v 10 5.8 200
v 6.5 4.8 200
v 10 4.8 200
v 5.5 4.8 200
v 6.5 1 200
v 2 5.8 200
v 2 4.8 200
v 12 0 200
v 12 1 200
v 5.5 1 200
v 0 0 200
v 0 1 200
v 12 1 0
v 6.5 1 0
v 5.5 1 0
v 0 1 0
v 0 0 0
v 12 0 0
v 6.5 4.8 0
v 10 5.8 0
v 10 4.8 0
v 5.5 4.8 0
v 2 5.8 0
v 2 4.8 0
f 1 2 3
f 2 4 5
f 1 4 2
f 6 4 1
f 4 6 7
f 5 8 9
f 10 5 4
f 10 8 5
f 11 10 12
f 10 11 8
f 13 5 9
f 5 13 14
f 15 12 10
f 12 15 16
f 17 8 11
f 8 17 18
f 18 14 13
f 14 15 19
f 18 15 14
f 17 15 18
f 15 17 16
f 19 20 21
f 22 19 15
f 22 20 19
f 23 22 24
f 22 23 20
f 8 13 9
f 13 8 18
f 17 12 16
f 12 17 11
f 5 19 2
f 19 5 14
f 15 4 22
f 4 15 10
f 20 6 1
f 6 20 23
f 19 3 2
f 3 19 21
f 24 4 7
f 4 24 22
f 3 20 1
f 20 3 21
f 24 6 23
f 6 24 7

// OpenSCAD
// file: rail.scad
include <parameters.scad>

// Fixed H rail. Overlap is confined to the web ends; the two flange inner
// faces stay exactly at Z=wall and Z=depth-wall (4 mm apart for the new rail).
module rail_geometry(length=rail_length, height=rail_height,
                     depth=rail_depth_target, front_height=rail_front_height,
                     wall=wall_thickness, web=wall_thickness) {
    front_y0 = (height-front_height)/2;
    web_y0 = (height-web)/2;
    assert(length>0 && height>=front_height && front_height>web);
    assert(depth>2*wall && wall>join_overlap && web>0);
    union() {
        // Cabinet mounting base; its rear face is exactly Z=0.
        cube([length, height, wall]);

        // Central web. It overlaps the base and flange by join_overlap.
        translate([0, web_y0, wall-join_overlap])
            cube([length, web, depth-2*wall+2*join_overlap]);

        // Person-facing load flange.
        translate([0, front_y0, depth-wall])
            cube([length, front_height, wall]);
    }
}

module rail_section_preview(section_x=20) {
    intersection() {
        rail_geometry();
        translate([rail_length / 2 - section_x / 2, -1, -1])
            cube([section_x, rail_height + 2, rail_depth_target + 2]);
    }
}

// Standalone printable entry point. debug_section is intentionally a source
// inspection mode, not a modifier on the final print geometry.
if (debug_section)
    rail_section_preview();
else
    rail_geometry();
// main file
// PETG FDM, X1 Carbon 0.4 mm. Units: mm. STL-only print entry.
// Same 12/8-mm, 5.8/3.8-mm H section as rail_legacy_8mm.scad.
// No permanent base or support: add removable 10-mm outer Brim in slicer.
// Assembly X (sliding) -> printer Z; assembly Y -> printer X;
// assembly Z (away from door) -> printer Y. Proper rotation, not a mirror.
// The one-piece rail mounts along its flat rear wing; no joint hardware.
include <parameters.scad>
use <rail.scad>

segment_length = 200;
assert(segment_length > 0 && segment_length <= 240,
       "Use at most 240 mm: leave 10 mm below this X1C profile's 250-mm limit");

multmatrix([[0, 1, 0, 0],
            [0, 0, 1, 0],
            [1, 0, 0, 0],
            [0, 0, 0, 1]])
    rail_geometry(length=segment_length, height=12, depth=5.8,
                  front_height=8, wall=1, web=1);
